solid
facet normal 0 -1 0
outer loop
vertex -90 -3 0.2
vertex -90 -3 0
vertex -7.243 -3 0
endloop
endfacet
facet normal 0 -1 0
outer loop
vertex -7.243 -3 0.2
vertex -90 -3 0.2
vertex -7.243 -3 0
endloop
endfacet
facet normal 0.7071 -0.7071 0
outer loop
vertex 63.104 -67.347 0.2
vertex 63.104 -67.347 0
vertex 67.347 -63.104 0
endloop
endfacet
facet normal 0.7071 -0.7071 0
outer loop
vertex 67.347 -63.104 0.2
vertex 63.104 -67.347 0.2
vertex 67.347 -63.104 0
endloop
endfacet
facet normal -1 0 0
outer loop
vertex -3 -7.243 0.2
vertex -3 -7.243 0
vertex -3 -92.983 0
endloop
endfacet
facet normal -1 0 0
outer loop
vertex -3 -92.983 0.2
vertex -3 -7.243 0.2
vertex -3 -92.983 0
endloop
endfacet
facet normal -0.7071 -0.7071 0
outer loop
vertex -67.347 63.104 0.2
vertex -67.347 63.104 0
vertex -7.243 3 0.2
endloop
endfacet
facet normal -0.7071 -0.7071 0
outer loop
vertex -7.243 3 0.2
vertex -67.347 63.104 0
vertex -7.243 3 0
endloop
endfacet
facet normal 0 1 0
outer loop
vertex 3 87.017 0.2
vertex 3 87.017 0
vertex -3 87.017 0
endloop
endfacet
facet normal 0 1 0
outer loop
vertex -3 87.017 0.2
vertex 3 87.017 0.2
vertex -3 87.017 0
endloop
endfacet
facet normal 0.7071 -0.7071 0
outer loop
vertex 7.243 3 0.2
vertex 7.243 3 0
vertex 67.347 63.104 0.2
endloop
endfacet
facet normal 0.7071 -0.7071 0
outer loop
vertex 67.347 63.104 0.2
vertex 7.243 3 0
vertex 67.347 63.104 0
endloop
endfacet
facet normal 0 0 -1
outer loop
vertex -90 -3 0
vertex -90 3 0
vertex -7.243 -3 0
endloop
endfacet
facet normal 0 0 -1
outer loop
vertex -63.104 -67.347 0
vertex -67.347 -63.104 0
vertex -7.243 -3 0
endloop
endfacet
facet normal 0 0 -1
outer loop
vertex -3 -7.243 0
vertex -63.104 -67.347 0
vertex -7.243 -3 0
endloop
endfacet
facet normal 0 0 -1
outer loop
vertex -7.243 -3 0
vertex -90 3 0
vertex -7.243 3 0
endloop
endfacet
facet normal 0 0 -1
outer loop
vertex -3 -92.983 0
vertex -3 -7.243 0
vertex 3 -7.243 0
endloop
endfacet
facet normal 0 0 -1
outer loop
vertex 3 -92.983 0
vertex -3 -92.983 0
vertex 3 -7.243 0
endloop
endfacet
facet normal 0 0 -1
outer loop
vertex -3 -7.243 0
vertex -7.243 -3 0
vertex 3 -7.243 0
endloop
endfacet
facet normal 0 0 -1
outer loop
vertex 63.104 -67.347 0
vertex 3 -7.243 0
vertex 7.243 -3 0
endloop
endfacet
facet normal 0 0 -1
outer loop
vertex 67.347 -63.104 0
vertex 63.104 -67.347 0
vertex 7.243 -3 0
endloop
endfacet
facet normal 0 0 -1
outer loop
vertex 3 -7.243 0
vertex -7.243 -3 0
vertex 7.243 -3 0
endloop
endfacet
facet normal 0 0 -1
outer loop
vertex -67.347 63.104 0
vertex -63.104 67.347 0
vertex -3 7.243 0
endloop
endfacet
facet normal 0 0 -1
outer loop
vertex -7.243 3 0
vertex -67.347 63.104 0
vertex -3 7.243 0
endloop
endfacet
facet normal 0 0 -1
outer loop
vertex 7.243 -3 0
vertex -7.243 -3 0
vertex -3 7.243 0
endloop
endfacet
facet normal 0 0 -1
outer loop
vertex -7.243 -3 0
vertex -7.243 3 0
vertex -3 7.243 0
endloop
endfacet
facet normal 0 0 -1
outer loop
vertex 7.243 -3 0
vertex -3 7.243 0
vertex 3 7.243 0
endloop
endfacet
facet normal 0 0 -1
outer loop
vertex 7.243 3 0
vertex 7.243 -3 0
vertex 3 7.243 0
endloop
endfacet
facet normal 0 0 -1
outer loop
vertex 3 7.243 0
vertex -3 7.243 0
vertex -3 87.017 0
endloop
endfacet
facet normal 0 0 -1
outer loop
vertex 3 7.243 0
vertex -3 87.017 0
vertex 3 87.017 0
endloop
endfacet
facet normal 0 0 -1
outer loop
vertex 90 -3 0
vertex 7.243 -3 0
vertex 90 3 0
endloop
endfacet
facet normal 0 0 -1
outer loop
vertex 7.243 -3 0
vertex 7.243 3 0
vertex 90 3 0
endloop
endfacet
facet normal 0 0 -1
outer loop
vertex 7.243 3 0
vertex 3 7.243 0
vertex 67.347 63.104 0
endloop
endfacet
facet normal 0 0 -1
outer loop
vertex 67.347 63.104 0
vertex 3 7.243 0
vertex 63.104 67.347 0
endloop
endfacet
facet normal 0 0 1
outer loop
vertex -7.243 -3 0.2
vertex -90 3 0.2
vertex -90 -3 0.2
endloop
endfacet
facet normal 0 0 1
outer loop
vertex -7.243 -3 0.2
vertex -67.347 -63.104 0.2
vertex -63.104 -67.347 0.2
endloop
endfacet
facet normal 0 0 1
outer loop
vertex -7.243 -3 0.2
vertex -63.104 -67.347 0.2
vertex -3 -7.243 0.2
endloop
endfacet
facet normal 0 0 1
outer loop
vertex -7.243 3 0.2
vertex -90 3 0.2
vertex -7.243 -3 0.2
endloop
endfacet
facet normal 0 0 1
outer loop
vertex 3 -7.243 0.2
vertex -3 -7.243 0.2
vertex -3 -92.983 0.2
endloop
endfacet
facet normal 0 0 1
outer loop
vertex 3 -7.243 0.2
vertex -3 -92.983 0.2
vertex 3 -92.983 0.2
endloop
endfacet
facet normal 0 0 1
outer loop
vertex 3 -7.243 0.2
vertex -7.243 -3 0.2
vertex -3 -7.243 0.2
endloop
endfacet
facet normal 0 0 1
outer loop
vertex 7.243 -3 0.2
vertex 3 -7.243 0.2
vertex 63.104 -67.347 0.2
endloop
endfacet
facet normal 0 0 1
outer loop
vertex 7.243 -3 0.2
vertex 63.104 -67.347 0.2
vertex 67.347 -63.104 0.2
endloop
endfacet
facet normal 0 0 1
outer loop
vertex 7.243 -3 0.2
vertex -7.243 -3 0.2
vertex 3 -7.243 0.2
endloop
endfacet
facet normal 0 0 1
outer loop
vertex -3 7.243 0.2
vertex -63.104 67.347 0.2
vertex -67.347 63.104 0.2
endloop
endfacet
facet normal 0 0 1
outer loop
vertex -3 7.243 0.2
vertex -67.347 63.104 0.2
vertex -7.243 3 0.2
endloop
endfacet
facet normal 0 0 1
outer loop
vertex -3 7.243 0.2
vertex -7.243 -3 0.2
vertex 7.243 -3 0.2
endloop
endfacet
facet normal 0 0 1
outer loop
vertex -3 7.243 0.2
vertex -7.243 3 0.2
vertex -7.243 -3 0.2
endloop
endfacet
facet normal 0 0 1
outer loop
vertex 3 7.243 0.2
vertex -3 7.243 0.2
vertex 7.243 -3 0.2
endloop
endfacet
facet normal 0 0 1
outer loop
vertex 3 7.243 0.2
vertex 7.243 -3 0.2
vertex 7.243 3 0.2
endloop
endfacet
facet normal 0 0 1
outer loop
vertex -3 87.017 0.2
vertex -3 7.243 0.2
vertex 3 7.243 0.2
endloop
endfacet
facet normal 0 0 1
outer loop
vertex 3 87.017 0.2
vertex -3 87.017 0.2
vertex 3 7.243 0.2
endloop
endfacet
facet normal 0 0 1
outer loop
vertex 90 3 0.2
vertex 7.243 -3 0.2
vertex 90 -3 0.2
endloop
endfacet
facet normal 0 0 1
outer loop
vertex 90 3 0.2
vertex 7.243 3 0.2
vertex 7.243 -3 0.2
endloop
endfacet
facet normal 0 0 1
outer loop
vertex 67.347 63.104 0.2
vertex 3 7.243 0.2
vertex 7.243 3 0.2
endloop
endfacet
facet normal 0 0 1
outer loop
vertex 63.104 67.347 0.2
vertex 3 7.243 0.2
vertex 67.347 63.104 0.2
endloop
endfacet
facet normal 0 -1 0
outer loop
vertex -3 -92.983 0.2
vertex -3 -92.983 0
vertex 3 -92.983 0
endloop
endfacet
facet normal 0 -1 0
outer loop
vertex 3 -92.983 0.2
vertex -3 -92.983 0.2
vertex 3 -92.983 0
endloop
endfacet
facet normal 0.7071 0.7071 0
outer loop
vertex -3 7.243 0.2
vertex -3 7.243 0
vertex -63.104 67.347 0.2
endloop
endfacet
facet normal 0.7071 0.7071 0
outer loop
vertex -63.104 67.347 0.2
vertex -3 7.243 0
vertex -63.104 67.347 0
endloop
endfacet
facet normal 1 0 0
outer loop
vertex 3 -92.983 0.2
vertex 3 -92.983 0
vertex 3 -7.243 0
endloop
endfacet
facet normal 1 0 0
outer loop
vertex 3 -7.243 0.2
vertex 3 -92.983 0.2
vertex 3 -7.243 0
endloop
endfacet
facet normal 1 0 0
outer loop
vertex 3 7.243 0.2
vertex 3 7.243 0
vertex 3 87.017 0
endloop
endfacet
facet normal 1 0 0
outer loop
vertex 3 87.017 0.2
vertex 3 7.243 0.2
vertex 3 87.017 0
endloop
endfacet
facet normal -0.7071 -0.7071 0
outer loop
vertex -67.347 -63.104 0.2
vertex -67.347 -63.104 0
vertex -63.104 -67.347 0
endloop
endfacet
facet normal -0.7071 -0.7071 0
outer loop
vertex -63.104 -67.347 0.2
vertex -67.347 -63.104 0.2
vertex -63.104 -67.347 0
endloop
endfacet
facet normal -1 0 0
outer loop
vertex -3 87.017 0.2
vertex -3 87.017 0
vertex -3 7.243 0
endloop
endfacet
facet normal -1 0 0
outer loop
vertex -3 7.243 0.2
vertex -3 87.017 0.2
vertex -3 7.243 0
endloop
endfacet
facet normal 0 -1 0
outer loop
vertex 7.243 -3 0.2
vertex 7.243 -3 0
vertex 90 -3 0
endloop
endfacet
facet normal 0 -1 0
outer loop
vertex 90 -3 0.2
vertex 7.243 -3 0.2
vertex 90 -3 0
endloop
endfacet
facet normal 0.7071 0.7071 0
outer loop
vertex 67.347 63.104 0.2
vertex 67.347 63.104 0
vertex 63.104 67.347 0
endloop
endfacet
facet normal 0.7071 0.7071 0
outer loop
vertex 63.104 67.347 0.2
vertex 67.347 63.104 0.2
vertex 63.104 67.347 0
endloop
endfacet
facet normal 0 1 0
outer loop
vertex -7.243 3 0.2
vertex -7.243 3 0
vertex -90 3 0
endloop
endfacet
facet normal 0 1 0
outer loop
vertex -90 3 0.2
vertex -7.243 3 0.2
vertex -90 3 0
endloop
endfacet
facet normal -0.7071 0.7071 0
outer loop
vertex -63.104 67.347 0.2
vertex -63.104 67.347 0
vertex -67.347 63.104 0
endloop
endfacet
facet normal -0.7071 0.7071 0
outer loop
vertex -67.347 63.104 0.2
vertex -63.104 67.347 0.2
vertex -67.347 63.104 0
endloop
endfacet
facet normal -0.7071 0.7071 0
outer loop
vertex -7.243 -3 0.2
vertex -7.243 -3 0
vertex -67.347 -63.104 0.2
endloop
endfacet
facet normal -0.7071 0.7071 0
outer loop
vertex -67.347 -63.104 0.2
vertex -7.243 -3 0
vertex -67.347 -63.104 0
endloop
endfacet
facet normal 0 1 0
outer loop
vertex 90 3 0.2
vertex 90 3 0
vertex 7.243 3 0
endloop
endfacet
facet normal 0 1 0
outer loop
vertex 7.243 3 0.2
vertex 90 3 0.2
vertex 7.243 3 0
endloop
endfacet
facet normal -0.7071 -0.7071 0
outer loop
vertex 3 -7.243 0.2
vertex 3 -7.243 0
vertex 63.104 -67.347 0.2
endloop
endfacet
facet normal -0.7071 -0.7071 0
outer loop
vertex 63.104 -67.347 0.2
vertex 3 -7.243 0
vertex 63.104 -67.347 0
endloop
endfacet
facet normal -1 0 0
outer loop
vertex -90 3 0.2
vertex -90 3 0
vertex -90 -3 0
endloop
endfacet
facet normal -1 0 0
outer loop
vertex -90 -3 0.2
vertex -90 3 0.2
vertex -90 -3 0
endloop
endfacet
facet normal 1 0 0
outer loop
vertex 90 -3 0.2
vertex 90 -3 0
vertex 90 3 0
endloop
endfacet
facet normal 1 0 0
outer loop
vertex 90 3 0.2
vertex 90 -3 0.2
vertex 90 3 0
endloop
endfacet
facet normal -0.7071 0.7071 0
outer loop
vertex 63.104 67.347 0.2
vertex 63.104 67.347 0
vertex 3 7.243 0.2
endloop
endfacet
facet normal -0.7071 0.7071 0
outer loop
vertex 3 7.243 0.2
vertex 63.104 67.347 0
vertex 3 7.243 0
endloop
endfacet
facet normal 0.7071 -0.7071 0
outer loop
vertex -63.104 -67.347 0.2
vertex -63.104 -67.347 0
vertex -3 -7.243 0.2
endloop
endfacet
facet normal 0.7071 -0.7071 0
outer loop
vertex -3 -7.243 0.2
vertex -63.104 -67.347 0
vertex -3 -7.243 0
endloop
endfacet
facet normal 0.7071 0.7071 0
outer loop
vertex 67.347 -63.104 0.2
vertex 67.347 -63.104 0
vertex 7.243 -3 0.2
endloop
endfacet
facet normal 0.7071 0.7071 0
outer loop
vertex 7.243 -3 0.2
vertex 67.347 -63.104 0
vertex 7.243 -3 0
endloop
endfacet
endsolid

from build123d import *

# Parameters (mm, degrees)
F1_DEPTH = 0.2


# Not quite as in the source:
# - a feature names something its author has since deleted; it is built from what else it names


with BuildPart() as f1:
    # F0 (on Top) → F1 (new body)
    with BuildSketch(Plane.XY):
        Polygon((3, 87.0174653775), (-3, 87.0174653775), (-3, 7.2426406871), (-3, 3), (3, 3), (3, 7.2426406871), align=None)
        Polygon((-7.2426406871, 3), (-3, 7.2426406871), (-63.1040764009, 67.346717088), (-67.346717088, 63.1040764009), align=None)
        Polygon((-3, 3), (-3, 7.2426406871), (-7.2426406871, 3), align=None)
        Polygon((7.2426406871, 3), (3, 7.2426406871), (3, 3), align=None)
        Polygon((63.1040764009, 67.346717088), (3, 7.2426406871), (7.2426406871, 3), (67.346717088, 63.1040764009), align=None)
        Polygon((3, 3), (-3, 3), (-3, 0), (0, 0), (3, 0), align=None)
        Polygon((-3, 0), (-3, 3), (-7.2426406871, 3), (-90, 3), (-90, -3), (-7.2426406871, -3), (-3, -3), align=None)
        Polygon((7.2426406871, 3), (3, 3), (3, 0), (3, -3), (7.2426406871, -3), (90, -3), (90, 3), align=None)
        Polygon((0, 0), (-3, 0), (-3, -3), (3, -3), (3, 0), align=None)
        Polygon((3, -3), (-3, -3), (-3, -7.2426406871), (-3, -92.9825346225), (3, -92.9825346225), (3, -7.2426406871), align=None)
        Polygon((-3, -7.2426406871), (-3, -3), (-7.2426406871, -3), align=None)
        Polygon((7.2426406871, -3), (3, -3), (3, -7.2426406871), align=None)
        Polygon((-63.1040764009, -67.346717088), (-3, -7.2426406871), (-7.2426406871, -3), (-67.346717088, -63.1040764009), align=None)
        Polygon((7.2426406871, -3), (3, -7.2426406871), (63.1040764009, -67.346717088), (67.346717088, -63.1040764009), align=None)
    extrude(amount=F1_DEPTH)


solid = f1.part
